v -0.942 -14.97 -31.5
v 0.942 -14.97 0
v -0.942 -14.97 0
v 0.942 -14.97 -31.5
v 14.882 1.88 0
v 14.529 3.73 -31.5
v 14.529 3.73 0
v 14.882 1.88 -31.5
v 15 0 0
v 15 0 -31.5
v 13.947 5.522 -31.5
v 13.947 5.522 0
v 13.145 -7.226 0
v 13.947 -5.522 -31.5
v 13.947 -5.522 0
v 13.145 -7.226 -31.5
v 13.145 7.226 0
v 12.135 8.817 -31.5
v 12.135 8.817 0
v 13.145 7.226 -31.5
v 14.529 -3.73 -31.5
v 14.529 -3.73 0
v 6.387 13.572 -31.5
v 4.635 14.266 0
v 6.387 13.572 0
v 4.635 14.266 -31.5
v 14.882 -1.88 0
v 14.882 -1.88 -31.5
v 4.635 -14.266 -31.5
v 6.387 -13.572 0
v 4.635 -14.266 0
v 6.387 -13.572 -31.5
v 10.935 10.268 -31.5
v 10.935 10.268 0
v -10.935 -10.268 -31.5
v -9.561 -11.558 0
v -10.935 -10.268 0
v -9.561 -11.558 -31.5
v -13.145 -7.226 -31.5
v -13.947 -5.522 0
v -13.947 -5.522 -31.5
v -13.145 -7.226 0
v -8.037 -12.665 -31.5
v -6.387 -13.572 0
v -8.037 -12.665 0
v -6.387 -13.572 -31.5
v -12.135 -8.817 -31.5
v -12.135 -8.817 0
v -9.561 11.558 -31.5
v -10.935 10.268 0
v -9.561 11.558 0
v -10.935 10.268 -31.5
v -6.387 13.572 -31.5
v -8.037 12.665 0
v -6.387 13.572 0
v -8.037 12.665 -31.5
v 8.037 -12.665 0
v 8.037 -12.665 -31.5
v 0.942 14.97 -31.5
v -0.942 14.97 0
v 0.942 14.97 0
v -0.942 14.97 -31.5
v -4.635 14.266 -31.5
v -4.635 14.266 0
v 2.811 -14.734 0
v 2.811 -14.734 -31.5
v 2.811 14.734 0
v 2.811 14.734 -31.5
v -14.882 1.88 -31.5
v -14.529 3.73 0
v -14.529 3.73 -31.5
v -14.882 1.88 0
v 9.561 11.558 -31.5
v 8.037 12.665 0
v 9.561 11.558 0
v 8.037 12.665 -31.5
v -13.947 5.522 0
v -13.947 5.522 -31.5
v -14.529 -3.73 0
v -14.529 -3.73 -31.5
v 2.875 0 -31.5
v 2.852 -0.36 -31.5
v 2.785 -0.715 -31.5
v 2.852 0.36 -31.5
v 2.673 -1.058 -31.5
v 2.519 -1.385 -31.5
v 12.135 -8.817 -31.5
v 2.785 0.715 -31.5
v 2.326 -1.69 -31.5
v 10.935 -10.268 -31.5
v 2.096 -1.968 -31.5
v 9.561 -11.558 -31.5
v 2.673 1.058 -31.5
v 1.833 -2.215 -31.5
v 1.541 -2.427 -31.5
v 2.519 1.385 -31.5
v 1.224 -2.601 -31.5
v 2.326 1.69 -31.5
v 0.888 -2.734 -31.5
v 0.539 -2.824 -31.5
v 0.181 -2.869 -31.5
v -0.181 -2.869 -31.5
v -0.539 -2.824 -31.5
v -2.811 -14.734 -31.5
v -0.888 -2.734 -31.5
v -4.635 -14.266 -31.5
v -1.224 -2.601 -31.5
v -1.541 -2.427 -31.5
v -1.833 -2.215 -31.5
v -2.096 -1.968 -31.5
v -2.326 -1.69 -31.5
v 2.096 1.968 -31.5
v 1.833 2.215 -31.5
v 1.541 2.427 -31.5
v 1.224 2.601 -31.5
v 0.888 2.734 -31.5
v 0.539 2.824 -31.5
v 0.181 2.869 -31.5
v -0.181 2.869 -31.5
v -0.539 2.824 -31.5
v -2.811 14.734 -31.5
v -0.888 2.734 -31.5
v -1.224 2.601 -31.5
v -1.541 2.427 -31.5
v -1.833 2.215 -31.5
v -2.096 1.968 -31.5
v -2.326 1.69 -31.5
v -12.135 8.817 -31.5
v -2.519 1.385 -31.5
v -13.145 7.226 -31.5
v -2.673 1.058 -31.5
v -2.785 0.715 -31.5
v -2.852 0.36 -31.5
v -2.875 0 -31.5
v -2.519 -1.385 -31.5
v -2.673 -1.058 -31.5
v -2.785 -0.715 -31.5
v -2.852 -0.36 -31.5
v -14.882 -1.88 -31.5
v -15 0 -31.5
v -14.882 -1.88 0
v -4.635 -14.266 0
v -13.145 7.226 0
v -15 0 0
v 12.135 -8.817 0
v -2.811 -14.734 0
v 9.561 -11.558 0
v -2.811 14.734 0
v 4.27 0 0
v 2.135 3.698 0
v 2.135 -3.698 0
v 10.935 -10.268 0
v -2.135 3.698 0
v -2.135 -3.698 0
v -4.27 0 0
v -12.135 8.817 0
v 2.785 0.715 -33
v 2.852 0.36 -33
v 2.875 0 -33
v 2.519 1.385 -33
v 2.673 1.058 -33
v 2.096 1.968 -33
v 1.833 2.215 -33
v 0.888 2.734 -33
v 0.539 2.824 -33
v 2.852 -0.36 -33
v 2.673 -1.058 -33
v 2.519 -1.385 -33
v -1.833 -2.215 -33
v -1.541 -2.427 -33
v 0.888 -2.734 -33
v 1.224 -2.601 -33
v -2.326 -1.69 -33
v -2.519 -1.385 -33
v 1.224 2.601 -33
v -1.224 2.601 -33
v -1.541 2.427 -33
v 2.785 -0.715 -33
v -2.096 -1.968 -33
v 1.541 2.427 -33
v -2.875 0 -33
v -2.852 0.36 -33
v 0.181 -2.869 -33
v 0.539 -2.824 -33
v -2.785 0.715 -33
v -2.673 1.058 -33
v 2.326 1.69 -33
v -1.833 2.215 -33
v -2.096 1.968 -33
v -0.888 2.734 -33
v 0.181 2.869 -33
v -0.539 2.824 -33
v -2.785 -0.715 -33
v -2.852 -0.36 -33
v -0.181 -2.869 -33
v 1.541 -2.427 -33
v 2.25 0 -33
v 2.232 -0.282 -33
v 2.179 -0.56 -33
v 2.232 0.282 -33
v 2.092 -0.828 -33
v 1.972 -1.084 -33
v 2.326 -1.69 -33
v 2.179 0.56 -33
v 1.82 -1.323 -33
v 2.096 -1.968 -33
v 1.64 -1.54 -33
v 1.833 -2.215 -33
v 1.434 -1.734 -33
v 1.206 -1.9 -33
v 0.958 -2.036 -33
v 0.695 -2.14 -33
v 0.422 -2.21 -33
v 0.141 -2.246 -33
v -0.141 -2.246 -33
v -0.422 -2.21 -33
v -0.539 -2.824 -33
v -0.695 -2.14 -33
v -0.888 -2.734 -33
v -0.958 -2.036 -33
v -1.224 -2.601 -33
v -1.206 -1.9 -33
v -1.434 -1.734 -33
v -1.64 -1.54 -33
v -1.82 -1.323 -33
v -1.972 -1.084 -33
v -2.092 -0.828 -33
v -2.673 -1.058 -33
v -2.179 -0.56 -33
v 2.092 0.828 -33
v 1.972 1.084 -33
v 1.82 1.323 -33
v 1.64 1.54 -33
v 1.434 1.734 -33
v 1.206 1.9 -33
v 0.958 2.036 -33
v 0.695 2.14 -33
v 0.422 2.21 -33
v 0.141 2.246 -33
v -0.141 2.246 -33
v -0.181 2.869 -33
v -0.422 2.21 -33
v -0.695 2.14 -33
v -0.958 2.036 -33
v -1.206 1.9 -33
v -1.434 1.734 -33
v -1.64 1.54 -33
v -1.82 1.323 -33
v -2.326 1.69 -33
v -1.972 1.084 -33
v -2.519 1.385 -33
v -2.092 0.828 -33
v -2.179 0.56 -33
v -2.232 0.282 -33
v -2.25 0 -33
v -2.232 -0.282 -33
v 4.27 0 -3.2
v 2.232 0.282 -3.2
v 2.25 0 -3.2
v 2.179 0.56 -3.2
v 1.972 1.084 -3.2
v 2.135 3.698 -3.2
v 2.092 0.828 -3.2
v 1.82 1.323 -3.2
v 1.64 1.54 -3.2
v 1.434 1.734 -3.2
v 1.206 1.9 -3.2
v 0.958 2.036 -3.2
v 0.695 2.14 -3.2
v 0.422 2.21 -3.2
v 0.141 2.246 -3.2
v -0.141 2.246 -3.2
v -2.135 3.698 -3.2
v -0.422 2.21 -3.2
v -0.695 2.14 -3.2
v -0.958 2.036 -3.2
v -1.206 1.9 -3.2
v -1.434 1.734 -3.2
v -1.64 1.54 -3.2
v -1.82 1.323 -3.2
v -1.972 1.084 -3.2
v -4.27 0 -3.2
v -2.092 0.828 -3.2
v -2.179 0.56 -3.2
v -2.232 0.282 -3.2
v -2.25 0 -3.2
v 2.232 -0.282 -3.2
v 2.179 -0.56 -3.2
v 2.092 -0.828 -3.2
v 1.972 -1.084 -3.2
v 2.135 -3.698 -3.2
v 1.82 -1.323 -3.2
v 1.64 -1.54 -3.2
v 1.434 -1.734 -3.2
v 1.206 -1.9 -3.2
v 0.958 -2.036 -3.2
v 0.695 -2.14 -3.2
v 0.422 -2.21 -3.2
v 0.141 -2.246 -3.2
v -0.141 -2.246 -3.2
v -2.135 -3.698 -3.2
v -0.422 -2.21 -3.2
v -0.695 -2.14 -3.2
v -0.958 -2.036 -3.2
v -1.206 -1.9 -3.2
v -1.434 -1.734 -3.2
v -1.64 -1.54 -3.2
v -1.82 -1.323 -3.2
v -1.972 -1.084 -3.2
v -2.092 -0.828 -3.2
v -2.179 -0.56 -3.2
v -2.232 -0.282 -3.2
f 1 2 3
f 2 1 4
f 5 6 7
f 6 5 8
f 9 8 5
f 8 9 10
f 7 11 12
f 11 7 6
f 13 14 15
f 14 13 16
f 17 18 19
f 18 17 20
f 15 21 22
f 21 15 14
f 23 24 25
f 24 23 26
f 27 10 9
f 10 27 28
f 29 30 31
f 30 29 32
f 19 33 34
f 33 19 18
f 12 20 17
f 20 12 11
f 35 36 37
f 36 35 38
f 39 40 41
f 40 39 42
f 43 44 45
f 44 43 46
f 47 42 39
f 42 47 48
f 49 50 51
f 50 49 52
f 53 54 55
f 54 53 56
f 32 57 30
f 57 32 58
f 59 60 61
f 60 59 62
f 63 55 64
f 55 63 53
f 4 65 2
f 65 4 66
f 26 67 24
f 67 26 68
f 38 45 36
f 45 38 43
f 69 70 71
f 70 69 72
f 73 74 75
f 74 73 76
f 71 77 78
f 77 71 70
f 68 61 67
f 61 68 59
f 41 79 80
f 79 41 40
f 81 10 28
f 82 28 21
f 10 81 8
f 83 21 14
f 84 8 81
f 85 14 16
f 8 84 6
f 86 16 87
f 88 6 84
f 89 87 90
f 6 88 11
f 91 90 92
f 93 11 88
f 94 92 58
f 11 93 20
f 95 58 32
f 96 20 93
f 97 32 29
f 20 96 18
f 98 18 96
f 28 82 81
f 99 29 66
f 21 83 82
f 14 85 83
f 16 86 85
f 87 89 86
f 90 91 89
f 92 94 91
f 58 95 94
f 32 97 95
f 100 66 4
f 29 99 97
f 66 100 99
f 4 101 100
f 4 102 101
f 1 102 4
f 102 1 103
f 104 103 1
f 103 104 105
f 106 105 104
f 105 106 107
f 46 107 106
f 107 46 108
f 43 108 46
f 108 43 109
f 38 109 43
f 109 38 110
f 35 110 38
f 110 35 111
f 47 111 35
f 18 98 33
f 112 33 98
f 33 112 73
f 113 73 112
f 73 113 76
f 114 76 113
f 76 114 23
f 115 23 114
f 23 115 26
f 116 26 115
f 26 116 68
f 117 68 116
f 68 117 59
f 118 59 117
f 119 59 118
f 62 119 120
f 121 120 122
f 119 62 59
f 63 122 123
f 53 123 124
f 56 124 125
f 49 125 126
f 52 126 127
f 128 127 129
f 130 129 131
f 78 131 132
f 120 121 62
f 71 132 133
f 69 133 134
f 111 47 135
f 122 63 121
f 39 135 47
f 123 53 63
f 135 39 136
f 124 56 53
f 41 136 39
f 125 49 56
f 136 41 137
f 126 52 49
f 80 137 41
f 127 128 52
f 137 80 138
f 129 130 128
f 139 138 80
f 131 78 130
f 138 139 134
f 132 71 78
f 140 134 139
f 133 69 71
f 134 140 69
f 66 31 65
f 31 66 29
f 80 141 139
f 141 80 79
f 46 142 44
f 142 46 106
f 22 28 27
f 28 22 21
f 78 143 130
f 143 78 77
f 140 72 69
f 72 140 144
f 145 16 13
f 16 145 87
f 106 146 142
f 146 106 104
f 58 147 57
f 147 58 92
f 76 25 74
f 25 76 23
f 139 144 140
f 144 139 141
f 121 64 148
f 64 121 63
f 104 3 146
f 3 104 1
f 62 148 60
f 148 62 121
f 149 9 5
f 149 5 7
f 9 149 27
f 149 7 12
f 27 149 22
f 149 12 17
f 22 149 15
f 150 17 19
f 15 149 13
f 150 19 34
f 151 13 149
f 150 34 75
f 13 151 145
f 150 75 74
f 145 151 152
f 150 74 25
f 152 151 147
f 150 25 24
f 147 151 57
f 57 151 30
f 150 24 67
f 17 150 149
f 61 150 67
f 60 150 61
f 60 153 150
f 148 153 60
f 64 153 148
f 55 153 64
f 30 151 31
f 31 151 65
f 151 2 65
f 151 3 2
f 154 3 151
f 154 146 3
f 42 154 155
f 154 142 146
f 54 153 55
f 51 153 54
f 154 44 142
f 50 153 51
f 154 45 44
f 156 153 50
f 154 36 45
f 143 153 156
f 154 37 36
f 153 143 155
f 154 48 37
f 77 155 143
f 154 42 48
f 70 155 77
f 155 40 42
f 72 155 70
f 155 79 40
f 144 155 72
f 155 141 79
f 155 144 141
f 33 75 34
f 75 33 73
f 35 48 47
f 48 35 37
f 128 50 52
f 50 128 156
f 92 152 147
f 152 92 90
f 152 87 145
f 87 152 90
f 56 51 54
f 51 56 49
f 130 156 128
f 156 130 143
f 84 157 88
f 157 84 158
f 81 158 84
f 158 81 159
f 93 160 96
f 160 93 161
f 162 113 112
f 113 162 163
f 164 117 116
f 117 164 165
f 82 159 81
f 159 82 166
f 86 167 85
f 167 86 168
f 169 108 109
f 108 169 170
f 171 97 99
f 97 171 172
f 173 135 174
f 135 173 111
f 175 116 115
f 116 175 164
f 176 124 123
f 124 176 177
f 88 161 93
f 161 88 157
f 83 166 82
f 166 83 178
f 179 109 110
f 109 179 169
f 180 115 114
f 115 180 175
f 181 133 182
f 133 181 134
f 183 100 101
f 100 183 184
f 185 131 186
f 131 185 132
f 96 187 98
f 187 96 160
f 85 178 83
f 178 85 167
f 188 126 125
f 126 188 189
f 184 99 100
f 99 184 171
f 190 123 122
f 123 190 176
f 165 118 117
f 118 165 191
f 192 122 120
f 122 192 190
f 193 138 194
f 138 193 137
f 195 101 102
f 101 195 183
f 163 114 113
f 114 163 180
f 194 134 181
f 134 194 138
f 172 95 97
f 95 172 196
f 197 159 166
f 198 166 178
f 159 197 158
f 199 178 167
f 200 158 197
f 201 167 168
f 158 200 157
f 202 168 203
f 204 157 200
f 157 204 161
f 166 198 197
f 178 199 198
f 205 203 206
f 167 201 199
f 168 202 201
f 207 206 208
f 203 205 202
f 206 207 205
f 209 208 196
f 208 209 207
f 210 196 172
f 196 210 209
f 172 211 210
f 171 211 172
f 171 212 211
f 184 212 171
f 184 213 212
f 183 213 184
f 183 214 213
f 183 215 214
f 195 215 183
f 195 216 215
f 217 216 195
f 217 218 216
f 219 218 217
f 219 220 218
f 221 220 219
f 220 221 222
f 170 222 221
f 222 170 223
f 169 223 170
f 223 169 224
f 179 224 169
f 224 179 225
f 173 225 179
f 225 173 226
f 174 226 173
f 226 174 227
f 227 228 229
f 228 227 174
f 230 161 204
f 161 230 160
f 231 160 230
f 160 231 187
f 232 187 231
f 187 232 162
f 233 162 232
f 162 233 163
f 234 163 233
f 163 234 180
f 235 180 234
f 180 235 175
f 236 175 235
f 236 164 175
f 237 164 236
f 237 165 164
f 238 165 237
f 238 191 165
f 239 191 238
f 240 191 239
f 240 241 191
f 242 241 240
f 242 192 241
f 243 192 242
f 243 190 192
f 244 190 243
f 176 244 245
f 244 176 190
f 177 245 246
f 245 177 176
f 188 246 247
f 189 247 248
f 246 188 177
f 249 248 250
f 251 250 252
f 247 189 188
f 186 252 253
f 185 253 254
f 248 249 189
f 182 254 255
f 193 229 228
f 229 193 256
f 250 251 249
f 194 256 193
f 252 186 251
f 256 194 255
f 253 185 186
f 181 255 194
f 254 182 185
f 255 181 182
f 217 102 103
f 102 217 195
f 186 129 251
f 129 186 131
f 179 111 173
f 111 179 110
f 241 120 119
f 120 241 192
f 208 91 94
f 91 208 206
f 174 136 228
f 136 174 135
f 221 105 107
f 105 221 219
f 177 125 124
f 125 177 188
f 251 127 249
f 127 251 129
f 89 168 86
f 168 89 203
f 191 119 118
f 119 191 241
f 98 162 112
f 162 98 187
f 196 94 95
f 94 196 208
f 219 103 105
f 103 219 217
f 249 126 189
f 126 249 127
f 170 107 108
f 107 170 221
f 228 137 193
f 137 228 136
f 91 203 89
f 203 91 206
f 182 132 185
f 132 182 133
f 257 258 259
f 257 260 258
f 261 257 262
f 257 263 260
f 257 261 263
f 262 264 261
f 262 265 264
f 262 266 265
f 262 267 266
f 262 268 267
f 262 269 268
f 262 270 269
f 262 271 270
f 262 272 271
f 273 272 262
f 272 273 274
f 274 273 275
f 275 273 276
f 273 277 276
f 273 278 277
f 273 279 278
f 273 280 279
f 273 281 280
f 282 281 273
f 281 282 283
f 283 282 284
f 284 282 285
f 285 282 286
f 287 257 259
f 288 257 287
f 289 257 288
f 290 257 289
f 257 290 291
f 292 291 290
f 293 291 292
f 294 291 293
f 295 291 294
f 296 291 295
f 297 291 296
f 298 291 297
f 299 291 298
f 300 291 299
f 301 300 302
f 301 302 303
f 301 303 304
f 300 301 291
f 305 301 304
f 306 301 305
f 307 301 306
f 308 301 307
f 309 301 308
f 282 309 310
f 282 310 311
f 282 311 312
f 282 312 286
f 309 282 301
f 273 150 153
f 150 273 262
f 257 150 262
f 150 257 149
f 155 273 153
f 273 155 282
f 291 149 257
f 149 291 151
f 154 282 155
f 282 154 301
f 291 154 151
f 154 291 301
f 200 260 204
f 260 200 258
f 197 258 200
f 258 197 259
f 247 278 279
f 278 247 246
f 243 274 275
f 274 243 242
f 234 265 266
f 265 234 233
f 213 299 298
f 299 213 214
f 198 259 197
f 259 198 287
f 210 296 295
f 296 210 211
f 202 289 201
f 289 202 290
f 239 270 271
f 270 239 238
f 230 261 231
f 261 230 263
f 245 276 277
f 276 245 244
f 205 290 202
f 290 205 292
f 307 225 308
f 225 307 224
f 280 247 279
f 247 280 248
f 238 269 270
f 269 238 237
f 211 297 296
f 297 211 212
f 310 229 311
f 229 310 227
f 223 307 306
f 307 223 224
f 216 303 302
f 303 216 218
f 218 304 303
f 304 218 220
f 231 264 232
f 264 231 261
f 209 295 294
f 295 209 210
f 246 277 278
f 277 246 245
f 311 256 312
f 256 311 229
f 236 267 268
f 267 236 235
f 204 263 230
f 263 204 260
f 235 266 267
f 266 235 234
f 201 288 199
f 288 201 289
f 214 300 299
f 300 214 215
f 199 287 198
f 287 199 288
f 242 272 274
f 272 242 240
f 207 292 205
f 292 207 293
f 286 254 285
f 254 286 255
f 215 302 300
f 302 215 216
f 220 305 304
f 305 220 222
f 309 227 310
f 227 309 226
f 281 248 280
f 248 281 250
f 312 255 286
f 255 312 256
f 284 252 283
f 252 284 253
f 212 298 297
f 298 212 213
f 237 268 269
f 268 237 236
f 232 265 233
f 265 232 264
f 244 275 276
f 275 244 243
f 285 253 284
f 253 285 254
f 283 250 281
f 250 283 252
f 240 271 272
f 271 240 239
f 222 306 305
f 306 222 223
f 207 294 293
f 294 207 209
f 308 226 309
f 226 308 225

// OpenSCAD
$fn = 50;

difference() {
	union() {
		translate(v = [0, 0, -31.5]) {
			cylinder(h = 31.5, r = 15.0);
		}
		#translate(v = [0, 0, -33.0]) {
			cylinder(h = 33, r = 2.875);
		}
	}
	union() {
		translate(v = [0, 0, 0]) {
			rotate(a = [0, 0, 0]) {
				difference() {
					union() {
						translate(v = [0, 0, -3.2]) {
							linear_extrude(height = 3.2) {
								polygon(points = [[4.2698, 0.0], [2.1349000000000005, 3.697755269078796], [-2.134899999999999, 3.6977552690787965], [-4.2698, 5.228996902999369e-16], [-2.134900000000002, -3.6977552690787956], [2.1348999999999974, -3.697755269078798]]);
							}
						}
					}
					union();
				}
			}
		}
		#translate(v = [0, 0, -100.0]) {
			cylinder(h = 200, r = 2.25);
		}
	}
}
